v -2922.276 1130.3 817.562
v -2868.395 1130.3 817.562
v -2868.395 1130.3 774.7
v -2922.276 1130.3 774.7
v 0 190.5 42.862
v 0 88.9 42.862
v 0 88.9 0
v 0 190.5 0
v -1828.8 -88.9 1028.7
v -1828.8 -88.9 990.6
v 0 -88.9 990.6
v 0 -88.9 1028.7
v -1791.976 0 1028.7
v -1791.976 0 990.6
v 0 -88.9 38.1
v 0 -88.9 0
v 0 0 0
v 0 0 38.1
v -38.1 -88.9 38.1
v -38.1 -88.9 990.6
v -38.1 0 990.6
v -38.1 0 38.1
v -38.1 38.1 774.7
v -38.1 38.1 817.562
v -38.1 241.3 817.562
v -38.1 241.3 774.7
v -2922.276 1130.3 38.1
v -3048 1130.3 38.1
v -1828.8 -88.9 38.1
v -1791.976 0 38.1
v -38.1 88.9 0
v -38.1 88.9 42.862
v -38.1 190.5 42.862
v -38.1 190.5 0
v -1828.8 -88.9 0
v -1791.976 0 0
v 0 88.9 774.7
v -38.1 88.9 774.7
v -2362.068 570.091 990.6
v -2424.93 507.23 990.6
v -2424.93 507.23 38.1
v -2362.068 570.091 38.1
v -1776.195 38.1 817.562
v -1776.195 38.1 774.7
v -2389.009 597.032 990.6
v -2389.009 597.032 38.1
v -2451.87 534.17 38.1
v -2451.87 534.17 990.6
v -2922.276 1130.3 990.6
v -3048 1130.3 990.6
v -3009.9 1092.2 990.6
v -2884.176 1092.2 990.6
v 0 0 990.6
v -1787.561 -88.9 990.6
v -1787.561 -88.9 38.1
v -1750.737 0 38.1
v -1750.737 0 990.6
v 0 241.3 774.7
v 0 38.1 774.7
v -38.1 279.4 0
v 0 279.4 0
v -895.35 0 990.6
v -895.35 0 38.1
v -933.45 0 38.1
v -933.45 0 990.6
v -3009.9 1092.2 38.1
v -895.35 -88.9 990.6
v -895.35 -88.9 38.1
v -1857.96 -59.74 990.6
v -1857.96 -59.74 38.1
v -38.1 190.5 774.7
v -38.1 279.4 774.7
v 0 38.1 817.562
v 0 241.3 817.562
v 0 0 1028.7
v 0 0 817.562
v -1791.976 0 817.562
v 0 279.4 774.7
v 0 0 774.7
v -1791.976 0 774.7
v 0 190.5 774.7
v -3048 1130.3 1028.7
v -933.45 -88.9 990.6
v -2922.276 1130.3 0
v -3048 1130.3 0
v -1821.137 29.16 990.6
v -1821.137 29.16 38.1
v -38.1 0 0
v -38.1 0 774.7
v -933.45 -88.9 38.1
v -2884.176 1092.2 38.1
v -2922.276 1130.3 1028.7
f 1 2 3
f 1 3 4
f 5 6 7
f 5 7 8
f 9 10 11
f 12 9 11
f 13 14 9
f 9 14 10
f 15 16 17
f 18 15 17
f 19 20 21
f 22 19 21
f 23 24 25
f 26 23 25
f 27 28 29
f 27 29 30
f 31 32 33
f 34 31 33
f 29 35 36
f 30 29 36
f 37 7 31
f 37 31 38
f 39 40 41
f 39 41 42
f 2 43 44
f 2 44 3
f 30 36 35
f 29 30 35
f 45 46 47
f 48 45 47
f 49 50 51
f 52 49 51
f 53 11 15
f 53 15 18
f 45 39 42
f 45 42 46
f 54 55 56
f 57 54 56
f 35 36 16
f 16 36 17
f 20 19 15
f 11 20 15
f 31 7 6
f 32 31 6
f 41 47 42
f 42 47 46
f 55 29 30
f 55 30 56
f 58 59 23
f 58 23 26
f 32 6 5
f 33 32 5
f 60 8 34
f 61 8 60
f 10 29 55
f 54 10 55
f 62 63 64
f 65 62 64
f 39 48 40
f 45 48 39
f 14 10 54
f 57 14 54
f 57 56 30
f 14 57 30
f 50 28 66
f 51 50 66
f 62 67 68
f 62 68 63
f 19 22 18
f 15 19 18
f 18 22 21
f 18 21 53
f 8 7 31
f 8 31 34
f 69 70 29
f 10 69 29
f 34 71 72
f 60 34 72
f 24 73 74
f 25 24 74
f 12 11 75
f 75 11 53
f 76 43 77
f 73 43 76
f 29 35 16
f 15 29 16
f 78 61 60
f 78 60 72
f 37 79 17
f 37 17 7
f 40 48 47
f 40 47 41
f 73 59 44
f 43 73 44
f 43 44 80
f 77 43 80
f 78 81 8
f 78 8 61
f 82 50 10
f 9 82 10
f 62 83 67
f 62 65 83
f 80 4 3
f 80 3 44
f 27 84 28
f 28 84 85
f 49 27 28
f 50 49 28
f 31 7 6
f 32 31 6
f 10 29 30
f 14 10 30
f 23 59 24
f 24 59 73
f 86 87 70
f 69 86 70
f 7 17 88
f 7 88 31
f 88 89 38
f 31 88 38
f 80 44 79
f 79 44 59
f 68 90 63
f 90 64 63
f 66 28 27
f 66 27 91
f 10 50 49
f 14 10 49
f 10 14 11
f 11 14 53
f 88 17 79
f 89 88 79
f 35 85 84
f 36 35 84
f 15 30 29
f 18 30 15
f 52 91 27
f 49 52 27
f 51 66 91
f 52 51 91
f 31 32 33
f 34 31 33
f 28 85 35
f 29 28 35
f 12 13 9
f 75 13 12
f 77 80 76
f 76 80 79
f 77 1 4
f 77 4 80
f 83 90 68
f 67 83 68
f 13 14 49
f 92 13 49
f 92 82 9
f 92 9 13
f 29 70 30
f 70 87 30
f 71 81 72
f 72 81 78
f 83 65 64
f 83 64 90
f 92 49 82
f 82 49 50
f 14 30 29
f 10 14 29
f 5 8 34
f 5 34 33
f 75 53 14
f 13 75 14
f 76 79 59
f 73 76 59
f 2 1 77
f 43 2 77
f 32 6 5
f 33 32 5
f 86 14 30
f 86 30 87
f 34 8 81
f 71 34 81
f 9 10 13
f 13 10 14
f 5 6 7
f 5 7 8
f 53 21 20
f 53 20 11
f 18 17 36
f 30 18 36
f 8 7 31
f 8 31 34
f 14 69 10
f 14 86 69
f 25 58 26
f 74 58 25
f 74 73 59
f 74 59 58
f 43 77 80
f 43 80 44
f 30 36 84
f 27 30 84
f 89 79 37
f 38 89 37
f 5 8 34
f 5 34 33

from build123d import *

# Parameters (mm, degrees)
F1_DEPTH  = 38.1
F3_DEPTH  = 38.1
F5_DEPTH  = 952.5
F6_W      = 38.1
F6_H      = 88.9
F7_DEPTH  = 952.5
F9_DEPTH  = 952.5
F11_DEPTH = 952.5
F13_DEPTH = 38.1
F15_DEPTH = 952.5
F17_DEPTH = 38.1
F19_DEPTH = 952.5
F20_W     = 88.9
F20_H     = 774.7
F21_DEPTH = 38.1
F22_W     = 101.6
F22_H     = 42.8625
F23_DEPTH = 38.1
F24_DEPTH = 38.1
F25_W     = 88.9
F25_H     = 774.7
F26_DEPTH = 38.1
F28_DEPTH = 42.8625
F29_W     = 203.2
F29_H     = 42.8625
F30_DEPTH = 38.1
F32_DEPTH = 42.8625


with BuildPart() as f1:
    # F0 (on Top) → F1 (new body)
    with BuildSketch(Plane.XY):
        Polygon((0, -88.9), (0, 0), (-1791.976414305, 0), (-1828.8, -88.9), align=None)
    extrude(amount=F1_DEPTH)


with BuildPart() as f3:
    # F2 (on Top) → F3 (new body, through all)
    with BuildSketch(Plane.XY):
        Polygon((-3048, 1130.3), (-1828.8, -88.9), (-1791.976414305, 0), (-2922.276414305, 1130.3), align=None)
    extrude(amount=F3_DEPTH)


with BuildPart() as f5:
    # F4 (on face) → F5 (new body)
    with BuildSketch(Plane.XY.offset(38.1)):
        Polygon((-1857.9604775462, -59.7395224538), (-1828.8, -88.9), (-1791.976414305, 0), (-1821.1368918513, 29.1604775462), align=None)
    extrude(amount=F5_DEPTH)


with BuildPart() as f7:
    # F6 (on face) → F7 (new body, through all)
    with BuildSketch(Plane.XY.offset(38.1)):
        with Locations((-19.05, -44.45)):
            Rectangle(F6_W, F6_H)
    extrude(amount=F7_DEPTH)


with BuildPart() as f9:
    # F8 (on face) → F9 (new body, through all)
    with BuildSketch(Plane.XY.offset(38.1)):
        Polygon((-1750.7372714739, 0), (-1791.976414305, 0), (-1828.8, -88.9), (-1787.5608571689, -88.9), align=None)
    extrude(amount=F9_DEPTH)


with BuildPart() as f11:
    # F10 (on face) → F11 (new body, through all)
    with BuildSketch(Plane.XY.offset(38.1)):
        Polygon((-933.45, -88.9), (-914.4, -88.9), (-895.35, -88.9), (-895.35, 0), (-933.45, 0), align=None)
    extrude(amount=F11_DEPTH)


with BuildPart() as f13:
    # F12 (on face) → F13 (new body)
    with BuildSketch(Plane.XY.offset(990.6)):
        Polygon((-1791.976414305, 0), (-1828.8, -88.9), (0, -88.9), (0, 0), align=None)
    extrude(amount=F13_DEPTH)


with BuildPart() as f15:
    # F14 (on face) → F15 (new body, through all)
    with BuildSketch(Plane.XY.offset(38.1)):
        Polygon((-2922.276414305, 1130.3), (-3048, 1130.3), (-3009.9, 1092.2), (-2884.176414305, 1092.2), align=None)
    extrude(amount=F15_DEPTH)


with BuildPart() as f17:
    # F16 (on face) → F17 (new body, through all)
    with BuildSketch(Plane.XY.offset(990.6)):
        Polygon((-3048, 1130.3), (-1828.8, -88.9), (-1791.976414305, 0), (-2922.276414305, 1130.3), align=None)
    extrude(amount=F17_DEPTH)


with BuildPart() as f19:
    # F18 (on face) → F19 (new body, through all)
    with BuildSketch(Plane.XY.offset(38.1)):
        Polygon((-2451.8703841816, 534.1703841816), (-2438.4, 520.7), (-2424.9296158184, 507.2296158184), (-2362.0678229709, 570.0914086659), (-2389.0085913341, 597.0321770291), align=None)
    extrude(amount=F19_DEPTH)


with BuildPart() as f21:
    # F20 (on face) → F21 (new body, through all)
    with BuildSketch(Plane.YZ):
        with Locations((44.45, 387.35)):
            Rectangle(F20_W, F20_H)
    extrude(amount=-F21_DEPTH)


with BuildPart() as f23:
    # F22 (on face) → F23 (new body, through all)
    with BuildSketch(Plane.YZ):
        with Locations((139.7, 21.43125)):
            Rectangle(F22_W, F22_H)
    extrude(amount=-F23_DEPTH)


with BuildPart() as f24:
    # F22 (on face) → F24 (new body, through all)
    with BuildSketch(Plane.YZ):
        with Locations((139.7, 21.43125)):
            Rectangle(F22_W, F22_H)
    extrude(amount=-F24_DEPTH)


with BuildPart() as f26:
    # F25 (on face) → F26 (new body, through all)
    with BuildSketch(Plane.YZ):
        with Locations((234.95, 387.35)):
            Rectangle(F25_W, F25_H)
    extrude(amount=-F26_DEPTH)


with BuildPart() as f28:
    # F27 (on face) → F28 (new body)
    with BuildSketch(Plane.XY.offset(774.7)):
        Polygon((-1791.976414305, 0), (0, 0), (0, 38.1), (-1776.1948775786, 38.1), align=None)
    extrude(amount=F28_DEPTH)


with BuildPart() as f30:
    # F29 (on face) → F30 (new body, through all)
    with BuildSketch(Plane.YZ):
        with Locations((139.7, 796.13125)):
            Rectangle(F29_W, F29_H)
    extrude(amount=-F30_DEPTH)


with BuildPart() as f32:
    # F31 (on face) → F32 (new body, through all)
    with BuildSketch(Plane.XY.offset(817.5625)):
        Polygon((-2922.276414305, 1130.3), (-1791.976414305, 0), (-1776.1948775786, 38.1), (-2868.3948775786, 1130.3), align=None)
    extrude(amount=-F32_DEPTH)


solid = Compound([f1.part, f3.part, f5.part, f7.part, f9.part, f11.part, f13.part, f15.part, f17.part, f19.part, f21.part, f23.part, f24.part, f26.part, f28.part, f30.part, f32.part])
